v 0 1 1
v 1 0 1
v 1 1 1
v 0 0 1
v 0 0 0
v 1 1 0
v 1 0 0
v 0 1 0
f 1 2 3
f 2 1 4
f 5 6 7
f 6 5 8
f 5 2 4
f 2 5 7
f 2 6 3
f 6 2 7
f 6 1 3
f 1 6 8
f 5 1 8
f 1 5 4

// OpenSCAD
/* Comparisons in comments don't count:
   if (finish == "matte") ... */
finish = "gloss";
// if (finish == "satin") ...
if (finish == "gloss") cube(1);
